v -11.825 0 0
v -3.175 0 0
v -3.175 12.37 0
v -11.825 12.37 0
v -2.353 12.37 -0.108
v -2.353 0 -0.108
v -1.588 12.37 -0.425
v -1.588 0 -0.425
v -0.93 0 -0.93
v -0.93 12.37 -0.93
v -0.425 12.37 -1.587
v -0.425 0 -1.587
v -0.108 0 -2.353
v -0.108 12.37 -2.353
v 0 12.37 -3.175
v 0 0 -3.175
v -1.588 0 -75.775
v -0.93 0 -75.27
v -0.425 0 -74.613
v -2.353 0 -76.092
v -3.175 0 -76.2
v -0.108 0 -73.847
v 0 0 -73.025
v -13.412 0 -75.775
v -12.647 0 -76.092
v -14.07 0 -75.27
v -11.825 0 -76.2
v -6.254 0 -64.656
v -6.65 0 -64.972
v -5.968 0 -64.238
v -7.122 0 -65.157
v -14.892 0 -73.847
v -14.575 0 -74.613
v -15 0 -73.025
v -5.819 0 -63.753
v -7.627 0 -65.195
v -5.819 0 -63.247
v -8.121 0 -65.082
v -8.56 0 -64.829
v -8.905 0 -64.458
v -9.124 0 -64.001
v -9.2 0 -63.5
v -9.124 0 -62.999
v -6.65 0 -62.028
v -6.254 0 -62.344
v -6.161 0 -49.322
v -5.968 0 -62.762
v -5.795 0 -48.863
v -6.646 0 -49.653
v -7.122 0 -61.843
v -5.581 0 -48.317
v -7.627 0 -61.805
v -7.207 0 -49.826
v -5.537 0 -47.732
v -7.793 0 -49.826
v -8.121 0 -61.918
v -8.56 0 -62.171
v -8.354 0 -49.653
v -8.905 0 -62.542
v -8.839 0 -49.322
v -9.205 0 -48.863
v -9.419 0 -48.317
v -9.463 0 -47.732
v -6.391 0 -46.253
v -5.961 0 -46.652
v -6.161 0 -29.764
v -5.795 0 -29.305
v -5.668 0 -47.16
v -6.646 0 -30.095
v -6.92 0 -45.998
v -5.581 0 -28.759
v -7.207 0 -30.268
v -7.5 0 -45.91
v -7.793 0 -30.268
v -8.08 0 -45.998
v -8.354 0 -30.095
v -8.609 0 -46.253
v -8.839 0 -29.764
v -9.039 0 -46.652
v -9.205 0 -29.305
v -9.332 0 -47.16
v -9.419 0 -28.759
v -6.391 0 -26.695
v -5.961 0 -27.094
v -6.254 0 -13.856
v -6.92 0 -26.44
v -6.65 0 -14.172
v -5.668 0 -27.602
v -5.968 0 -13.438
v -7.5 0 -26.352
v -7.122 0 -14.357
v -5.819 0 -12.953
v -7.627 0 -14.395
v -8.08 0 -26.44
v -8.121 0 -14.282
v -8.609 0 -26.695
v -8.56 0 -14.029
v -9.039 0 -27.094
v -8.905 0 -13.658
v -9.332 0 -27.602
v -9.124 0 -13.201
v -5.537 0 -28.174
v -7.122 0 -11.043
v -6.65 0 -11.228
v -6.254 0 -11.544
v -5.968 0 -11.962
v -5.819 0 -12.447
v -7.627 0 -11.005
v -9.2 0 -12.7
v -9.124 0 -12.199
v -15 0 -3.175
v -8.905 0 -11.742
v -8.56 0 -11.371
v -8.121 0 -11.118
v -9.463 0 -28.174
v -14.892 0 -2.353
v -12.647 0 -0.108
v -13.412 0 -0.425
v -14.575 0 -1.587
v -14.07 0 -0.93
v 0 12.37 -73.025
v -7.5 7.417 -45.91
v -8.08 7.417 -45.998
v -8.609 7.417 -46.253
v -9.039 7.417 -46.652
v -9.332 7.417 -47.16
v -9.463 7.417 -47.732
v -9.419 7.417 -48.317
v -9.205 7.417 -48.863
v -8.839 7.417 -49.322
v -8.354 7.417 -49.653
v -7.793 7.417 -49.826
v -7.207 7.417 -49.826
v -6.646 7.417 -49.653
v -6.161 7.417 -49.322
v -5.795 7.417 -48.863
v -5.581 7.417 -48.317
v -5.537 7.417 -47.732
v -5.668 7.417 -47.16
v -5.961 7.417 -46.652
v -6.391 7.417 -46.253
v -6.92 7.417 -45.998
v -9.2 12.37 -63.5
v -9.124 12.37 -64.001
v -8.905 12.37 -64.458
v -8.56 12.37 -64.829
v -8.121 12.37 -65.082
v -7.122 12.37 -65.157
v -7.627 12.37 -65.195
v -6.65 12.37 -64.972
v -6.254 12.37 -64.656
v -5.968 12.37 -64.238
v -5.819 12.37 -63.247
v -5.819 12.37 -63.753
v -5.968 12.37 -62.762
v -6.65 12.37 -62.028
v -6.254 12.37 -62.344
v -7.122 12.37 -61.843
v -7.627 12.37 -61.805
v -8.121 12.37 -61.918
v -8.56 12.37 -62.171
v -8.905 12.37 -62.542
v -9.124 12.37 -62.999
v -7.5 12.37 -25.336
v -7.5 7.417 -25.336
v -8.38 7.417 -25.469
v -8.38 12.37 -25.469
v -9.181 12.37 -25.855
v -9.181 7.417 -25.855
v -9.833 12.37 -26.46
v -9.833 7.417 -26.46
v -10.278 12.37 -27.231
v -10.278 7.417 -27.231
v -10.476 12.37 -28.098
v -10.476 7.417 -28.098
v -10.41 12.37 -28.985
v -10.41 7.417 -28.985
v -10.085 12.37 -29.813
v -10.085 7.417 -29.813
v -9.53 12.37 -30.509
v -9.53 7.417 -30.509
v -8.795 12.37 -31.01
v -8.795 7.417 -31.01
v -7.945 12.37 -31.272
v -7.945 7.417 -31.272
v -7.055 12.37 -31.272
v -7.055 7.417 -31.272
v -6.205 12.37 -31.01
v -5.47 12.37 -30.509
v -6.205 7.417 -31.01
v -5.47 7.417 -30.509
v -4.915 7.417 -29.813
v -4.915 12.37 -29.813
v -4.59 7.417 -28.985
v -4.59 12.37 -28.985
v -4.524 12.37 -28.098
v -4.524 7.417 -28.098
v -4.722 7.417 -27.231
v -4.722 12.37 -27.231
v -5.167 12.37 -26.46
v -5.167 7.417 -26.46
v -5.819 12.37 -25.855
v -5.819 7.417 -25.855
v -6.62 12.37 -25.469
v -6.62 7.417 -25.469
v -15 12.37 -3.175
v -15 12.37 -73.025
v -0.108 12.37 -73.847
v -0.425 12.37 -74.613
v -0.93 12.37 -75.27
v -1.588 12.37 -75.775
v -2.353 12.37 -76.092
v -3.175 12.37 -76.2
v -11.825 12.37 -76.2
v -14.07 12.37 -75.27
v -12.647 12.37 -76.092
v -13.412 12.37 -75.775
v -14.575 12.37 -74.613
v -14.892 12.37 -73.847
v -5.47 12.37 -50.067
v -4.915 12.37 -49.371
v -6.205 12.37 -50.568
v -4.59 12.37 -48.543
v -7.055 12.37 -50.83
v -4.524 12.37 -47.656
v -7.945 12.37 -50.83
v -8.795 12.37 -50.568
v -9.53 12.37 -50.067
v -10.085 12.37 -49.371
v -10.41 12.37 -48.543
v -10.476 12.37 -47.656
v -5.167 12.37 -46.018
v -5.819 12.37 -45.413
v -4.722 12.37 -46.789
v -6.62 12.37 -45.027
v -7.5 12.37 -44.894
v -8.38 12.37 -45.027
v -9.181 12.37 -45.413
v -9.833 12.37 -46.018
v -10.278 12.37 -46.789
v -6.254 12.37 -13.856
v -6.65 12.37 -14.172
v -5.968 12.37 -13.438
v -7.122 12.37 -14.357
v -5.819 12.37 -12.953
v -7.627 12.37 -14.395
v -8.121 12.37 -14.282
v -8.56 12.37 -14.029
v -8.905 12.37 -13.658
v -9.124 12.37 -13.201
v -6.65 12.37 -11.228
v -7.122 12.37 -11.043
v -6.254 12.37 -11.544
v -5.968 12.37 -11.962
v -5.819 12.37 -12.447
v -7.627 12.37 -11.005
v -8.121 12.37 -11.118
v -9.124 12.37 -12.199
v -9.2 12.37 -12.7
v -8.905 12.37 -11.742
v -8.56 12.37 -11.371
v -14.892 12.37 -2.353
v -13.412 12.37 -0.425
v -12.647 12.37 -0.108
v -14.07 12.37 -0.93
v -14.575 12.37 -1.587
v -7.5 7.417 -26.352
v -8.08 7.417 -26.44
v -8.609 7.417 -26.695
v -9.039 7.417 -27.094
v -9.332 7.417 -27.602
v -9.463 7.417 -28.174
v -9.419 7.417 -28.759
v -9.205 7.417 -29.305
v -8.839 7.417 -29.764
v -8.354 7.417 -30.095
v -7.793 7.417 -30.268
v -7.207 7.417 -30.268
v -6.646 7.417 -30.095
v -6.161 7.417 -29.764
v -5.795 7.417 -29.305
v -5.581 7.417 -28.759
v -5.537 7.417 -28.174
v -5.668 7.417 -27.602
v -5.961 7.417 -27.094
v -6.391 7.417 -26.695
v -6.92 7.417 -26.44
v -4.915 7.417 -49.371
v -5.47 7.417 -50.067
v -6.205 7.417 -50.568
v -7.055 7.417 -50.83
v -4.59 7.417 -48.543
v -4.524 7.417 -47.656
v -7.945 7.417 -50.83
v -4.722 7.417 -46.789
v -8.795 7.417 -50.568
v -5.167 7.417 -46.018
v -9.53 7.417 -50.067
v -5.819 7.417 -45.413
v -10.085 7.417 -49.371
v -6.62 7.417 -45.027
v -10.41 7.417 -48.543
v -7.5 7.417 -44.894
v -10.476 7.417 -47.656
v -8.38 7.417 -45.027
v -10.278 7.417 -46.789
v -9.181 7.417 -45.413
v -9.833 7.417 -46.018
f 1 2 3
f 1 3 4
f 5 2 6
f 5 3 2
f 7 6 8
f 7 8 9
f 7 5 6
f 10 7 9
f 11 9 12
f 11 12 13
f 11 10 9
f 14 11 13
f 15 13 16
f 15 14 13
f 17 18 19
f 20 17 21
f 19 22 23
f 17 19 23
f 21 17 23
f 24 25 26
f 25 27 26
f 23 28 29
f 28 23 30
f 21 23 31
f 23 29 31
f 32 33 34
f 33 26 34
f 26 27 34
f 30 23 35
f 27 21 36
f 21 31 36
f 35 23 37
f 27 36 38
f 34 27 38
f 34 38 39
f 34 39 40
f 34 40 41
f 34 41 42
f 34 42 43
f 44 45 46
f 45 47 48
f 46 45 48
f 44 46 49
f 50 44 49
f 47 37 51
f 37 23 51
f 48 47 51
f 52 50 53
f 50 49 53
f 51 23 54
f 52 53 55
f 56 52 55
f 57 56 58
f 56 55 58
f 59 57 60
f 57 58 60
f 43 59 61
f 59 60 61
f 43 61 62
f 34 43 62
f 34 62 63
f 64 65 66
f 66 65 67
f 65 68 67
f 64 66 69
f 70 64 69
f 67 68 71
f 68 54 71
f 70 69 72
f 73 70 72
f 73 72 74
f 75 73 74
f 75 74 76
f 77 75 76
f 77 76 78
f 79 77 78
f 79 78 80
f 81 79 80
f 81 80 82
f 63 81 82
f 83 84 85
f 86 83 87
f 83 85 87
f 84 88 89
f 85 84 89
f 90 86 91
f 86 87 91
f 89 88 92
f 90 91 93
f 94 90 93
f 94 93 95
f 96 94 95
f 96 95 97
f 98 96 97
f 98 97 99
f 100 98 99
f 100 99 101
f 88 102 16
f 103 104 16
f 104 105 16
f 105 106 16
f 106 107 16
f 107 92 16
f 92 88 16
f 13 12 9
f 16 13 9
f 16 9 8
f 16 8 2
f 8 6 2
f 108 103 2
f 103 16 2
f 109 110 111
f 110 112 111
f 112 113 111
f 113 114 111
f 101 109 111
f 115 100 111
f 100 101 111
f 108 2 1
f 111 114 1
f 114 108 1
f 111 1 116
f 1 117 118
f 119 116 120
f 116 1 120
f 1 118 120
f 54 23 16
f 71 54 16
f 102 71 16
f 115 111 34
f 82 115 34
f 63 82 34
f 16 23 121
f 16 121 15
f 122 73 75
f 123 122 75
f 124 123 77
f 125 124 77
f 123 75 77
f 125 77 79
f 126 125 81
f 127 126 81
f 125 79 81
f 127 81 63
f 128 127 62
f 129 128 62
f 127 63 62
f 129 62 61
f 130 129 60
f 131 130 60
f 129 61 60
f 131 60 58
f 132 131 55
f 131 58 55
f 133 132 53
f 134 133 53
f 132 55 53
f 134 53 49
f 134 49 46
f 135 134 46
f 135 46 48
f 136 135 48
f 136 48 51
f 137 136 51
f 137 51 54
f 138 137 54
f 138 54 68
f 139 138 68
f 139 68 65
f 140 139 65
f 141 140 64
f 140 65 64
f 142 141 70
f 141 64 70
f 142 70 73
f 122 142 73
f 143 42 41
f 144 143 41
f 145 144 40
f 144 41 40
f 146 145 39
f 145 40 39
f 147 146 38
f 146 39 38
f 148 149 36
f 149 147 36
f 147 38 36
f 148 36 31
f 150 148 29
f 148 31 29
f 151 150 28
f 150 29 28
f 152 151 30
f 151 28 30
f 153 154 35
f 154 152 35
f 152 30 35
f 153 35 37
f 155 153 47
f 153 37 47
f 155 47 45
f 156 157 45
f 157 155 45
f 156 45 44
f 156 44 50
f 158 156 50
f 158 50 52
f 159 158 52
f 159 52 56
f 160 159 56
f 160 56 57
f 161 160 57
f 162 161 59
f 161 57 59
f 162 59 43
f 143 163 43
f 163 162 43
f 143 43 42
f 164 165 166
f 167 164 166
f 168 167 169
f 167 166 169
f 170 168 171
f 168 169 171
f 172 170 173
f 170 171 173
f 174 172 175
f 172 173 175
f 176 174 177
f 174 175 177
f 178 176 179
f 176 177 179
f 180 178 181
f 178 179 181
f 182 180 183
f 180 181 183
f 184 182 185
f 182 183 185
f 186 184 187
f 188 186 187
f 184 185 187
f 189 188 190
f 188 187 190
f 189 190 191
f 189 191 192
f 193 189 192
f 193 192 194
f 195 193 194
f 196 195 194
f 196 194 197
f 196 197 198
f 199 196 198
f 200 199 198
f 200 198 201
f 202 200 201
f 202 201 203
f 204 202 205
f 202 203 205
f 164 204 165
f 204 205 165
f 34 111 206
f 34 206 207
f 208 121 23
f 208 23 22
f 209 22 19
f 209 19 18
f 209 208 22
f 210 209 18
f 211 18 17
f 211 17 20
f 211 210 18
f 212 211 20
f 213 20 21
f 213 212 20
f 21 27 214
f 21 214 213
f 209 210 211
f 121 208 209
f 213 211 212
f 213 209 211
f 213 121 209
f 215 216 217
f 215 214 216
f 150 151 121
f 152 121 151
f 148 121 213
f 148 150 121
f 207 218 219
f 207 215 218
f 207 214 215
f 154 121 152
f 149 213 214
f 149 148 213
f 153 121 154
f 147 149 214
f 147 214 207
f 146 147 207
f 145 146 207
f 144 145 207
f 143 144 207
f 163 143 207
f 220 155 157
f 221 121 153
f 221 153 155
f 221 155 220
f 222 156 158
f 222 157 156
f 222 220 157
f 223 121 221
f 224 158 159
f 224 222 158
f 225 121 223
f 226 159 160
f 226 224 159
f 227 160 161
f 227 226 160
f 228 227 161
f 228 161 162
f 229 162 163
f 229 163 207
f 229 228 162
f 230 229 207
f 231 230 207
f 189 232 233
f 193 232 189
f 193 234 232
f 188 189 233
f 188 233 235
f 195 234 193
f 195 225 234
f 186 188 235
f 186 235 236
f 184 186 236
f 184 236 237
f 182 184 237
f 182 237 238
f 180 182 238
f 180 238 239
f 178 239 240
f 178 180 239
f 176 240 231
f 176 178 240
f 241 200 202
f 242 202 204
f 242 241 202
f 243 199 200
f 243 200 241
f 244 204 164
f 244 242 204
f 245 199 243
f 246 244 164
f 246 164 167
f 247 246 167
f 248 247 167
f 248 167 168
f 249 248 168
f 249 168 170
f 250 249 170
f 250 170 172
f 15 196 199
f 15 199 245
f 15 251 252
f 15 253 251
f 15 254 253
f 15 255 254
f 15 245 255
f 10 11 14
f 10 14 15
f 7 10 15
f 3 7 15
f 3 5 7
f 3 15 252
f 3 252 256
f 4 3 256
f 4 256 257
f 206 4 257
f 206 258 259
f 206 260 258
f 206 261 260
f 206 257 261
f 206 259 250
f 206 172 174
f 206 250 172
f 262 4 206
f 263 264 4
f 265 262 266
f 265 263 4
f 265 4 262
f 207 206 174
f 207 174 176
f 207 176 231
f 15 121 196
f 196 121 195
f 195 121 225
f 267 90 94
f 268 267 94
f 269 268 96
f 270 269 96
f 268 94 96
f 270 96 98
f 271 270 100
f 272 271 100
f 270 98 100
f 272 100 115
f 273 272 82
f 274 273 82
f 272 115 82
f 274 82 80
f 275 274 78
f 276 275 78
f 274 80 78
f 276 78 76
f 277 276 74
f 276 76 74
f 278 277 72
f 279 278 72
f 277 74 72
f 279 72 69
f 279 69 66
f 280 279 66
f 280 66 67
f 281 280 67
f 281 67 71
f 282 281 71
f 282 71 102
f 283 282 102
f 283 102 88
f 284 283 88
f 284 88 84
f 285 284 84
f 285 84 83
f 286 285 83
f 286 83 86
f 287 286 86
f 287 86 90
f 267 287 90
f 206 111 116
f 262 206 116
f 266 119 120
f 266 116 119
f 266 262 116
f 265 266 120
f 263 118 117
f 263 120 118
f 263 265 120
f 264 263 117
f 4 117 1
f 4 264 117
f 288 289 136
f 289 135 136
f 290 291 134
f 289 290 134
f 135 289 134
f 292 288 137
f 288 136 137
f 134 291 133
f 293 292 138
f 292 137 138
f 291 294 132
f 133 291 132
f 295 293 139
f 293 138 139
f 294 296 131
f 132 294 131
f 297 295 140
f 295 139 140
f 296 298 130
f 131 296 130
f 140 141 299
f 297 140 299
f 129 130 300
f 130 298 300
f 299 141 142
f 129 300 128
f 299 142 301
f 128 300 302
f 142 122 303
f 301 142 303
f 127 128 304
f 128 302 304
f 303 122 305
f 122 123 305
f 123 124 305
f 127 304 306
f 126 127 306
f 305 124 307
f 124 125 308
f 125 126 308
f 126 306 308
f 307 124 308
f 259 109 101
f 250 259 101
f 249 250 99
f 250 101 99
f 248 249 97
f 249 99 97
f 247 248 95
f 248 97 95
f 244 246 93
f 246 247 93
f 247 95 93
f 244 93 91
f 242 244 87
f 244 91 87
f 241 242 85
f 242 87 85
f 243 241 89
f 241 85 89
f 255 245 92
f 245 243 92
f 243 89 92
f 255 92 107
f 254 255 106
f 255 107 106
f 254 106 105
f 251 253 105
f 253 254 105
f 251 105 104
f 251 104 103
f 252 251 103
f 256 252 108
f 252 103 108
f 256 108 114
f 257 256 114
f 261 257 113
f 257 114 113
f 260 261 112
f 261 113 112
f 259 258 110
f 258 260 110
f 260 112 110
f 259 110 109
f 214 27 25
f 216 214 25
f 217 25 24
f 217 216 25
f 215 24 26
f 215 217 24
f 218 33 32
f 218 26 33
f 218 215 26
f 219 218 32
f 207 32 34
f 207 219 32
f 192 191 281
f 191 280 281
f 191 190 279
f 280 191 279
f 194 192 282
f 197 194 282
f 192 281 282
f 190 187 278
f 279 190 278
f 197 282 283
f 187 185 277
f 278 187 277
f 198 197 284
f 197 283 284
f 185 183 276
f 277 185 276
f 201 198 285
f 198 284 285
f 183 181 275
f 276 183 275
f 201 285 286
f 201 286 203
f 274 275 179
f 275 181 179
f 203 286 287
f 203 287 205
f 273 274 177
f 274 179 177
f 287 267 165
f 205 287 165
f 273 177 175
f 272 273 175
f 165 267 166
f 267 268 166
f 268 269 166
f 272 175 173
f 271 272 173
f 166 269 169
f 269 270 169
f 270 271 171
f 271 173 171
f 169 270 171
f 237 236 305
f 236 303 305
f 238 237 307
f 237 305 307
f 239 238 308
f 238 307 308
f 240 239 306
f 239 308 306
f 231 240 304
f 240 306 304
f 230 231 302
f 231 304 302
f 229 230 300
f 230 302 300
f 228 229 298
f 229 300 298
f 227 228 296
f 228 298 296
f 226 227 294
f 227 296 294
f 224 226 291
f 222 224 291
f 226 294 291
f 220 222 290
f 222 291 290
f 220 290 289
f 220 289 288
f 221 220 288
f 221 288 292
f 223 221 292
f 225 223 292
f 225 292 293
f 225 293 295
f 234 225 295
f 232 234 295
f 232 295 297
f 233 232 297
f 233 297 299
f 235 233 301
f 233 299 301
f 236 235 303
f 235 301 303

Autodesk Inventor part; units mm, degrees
ref_plane "YZ Plane" through (0, 0, 0) normal (1, 0, 0) x (0, 1, 0)
ref_plane "XZ Plane" through (0, 0, 0) normal (0, 1, 0) x (-1, 0, 0)
ref_plane "XY Plane" through (0, 0, 0) normal (0, 0, 1) x (1, 0, 0)
sketch "Sketch1" plane through (0, 0, 0) normal (0, 1, 0) x (-1, 0, 0)
  line L0 (0, 0) -> (15, 0)
  line L1 (15, 0) -> (15, -76.2)
  line L2 (15, -76.2) -> (0, -76.2)
  line L3 (0, -76.2) -> (0, 0)
  circle A0 centre (7.5, -12.7) radius 1.7
  circle A1 centre (7.5, -63.5) radius 1.7
  dimension "d0" = 15
  dimension "d1" = 76.2
  dimension "d2" = 3.4
  dimension "d3" = 3.4
  dimension "d4" = 12.7
  dimension "d5" = 12.7
extrude "Extrusion1" add sketch "Sketch1" along normal blind 12.3698
sketch "Sketch2" plane through (0, 12.3698, 0) normal (0, 1, 0) x (1, 0, 0)
  circle A0 centre (-7.5, 28.321) radius 1.9685 construction
  circle A1 centre (-7.5, 47.879) radius 1.9685 construction
  line L0 (-15, 76.2) -> (-15, 0) projected
  line L1 (0, 76.2) -> (-15, 76.2) projected
  line L2 (-15, 0) -> (0, 0) projected
  dimension "d8" = 3.937
  dimension "d9" = 3.937
  dimension "d10" = 19.558
  dimension "d11" = 7.5
  dimension "d12" = 7.5
  dimension "d13" = 28.321
  dimension "d14" = 28.321
hole "Hole1" at (-7.5, 12.3698, -28.321) at (-7.5, 12.3698, -47.879) direction (0, -1, 0) diameter 3.937 depth 20.32 counterbore diameter 5.969 counterbore depth 4.953
fillet "Fillet1" radius 3.175 4 edges at (-15, 6.1849, -76.2) (0, 6.1849, -76.2) (0, 6.1849, 0) (-15, 6.1849, 0)
properties part number "Collection rotation adapter"
